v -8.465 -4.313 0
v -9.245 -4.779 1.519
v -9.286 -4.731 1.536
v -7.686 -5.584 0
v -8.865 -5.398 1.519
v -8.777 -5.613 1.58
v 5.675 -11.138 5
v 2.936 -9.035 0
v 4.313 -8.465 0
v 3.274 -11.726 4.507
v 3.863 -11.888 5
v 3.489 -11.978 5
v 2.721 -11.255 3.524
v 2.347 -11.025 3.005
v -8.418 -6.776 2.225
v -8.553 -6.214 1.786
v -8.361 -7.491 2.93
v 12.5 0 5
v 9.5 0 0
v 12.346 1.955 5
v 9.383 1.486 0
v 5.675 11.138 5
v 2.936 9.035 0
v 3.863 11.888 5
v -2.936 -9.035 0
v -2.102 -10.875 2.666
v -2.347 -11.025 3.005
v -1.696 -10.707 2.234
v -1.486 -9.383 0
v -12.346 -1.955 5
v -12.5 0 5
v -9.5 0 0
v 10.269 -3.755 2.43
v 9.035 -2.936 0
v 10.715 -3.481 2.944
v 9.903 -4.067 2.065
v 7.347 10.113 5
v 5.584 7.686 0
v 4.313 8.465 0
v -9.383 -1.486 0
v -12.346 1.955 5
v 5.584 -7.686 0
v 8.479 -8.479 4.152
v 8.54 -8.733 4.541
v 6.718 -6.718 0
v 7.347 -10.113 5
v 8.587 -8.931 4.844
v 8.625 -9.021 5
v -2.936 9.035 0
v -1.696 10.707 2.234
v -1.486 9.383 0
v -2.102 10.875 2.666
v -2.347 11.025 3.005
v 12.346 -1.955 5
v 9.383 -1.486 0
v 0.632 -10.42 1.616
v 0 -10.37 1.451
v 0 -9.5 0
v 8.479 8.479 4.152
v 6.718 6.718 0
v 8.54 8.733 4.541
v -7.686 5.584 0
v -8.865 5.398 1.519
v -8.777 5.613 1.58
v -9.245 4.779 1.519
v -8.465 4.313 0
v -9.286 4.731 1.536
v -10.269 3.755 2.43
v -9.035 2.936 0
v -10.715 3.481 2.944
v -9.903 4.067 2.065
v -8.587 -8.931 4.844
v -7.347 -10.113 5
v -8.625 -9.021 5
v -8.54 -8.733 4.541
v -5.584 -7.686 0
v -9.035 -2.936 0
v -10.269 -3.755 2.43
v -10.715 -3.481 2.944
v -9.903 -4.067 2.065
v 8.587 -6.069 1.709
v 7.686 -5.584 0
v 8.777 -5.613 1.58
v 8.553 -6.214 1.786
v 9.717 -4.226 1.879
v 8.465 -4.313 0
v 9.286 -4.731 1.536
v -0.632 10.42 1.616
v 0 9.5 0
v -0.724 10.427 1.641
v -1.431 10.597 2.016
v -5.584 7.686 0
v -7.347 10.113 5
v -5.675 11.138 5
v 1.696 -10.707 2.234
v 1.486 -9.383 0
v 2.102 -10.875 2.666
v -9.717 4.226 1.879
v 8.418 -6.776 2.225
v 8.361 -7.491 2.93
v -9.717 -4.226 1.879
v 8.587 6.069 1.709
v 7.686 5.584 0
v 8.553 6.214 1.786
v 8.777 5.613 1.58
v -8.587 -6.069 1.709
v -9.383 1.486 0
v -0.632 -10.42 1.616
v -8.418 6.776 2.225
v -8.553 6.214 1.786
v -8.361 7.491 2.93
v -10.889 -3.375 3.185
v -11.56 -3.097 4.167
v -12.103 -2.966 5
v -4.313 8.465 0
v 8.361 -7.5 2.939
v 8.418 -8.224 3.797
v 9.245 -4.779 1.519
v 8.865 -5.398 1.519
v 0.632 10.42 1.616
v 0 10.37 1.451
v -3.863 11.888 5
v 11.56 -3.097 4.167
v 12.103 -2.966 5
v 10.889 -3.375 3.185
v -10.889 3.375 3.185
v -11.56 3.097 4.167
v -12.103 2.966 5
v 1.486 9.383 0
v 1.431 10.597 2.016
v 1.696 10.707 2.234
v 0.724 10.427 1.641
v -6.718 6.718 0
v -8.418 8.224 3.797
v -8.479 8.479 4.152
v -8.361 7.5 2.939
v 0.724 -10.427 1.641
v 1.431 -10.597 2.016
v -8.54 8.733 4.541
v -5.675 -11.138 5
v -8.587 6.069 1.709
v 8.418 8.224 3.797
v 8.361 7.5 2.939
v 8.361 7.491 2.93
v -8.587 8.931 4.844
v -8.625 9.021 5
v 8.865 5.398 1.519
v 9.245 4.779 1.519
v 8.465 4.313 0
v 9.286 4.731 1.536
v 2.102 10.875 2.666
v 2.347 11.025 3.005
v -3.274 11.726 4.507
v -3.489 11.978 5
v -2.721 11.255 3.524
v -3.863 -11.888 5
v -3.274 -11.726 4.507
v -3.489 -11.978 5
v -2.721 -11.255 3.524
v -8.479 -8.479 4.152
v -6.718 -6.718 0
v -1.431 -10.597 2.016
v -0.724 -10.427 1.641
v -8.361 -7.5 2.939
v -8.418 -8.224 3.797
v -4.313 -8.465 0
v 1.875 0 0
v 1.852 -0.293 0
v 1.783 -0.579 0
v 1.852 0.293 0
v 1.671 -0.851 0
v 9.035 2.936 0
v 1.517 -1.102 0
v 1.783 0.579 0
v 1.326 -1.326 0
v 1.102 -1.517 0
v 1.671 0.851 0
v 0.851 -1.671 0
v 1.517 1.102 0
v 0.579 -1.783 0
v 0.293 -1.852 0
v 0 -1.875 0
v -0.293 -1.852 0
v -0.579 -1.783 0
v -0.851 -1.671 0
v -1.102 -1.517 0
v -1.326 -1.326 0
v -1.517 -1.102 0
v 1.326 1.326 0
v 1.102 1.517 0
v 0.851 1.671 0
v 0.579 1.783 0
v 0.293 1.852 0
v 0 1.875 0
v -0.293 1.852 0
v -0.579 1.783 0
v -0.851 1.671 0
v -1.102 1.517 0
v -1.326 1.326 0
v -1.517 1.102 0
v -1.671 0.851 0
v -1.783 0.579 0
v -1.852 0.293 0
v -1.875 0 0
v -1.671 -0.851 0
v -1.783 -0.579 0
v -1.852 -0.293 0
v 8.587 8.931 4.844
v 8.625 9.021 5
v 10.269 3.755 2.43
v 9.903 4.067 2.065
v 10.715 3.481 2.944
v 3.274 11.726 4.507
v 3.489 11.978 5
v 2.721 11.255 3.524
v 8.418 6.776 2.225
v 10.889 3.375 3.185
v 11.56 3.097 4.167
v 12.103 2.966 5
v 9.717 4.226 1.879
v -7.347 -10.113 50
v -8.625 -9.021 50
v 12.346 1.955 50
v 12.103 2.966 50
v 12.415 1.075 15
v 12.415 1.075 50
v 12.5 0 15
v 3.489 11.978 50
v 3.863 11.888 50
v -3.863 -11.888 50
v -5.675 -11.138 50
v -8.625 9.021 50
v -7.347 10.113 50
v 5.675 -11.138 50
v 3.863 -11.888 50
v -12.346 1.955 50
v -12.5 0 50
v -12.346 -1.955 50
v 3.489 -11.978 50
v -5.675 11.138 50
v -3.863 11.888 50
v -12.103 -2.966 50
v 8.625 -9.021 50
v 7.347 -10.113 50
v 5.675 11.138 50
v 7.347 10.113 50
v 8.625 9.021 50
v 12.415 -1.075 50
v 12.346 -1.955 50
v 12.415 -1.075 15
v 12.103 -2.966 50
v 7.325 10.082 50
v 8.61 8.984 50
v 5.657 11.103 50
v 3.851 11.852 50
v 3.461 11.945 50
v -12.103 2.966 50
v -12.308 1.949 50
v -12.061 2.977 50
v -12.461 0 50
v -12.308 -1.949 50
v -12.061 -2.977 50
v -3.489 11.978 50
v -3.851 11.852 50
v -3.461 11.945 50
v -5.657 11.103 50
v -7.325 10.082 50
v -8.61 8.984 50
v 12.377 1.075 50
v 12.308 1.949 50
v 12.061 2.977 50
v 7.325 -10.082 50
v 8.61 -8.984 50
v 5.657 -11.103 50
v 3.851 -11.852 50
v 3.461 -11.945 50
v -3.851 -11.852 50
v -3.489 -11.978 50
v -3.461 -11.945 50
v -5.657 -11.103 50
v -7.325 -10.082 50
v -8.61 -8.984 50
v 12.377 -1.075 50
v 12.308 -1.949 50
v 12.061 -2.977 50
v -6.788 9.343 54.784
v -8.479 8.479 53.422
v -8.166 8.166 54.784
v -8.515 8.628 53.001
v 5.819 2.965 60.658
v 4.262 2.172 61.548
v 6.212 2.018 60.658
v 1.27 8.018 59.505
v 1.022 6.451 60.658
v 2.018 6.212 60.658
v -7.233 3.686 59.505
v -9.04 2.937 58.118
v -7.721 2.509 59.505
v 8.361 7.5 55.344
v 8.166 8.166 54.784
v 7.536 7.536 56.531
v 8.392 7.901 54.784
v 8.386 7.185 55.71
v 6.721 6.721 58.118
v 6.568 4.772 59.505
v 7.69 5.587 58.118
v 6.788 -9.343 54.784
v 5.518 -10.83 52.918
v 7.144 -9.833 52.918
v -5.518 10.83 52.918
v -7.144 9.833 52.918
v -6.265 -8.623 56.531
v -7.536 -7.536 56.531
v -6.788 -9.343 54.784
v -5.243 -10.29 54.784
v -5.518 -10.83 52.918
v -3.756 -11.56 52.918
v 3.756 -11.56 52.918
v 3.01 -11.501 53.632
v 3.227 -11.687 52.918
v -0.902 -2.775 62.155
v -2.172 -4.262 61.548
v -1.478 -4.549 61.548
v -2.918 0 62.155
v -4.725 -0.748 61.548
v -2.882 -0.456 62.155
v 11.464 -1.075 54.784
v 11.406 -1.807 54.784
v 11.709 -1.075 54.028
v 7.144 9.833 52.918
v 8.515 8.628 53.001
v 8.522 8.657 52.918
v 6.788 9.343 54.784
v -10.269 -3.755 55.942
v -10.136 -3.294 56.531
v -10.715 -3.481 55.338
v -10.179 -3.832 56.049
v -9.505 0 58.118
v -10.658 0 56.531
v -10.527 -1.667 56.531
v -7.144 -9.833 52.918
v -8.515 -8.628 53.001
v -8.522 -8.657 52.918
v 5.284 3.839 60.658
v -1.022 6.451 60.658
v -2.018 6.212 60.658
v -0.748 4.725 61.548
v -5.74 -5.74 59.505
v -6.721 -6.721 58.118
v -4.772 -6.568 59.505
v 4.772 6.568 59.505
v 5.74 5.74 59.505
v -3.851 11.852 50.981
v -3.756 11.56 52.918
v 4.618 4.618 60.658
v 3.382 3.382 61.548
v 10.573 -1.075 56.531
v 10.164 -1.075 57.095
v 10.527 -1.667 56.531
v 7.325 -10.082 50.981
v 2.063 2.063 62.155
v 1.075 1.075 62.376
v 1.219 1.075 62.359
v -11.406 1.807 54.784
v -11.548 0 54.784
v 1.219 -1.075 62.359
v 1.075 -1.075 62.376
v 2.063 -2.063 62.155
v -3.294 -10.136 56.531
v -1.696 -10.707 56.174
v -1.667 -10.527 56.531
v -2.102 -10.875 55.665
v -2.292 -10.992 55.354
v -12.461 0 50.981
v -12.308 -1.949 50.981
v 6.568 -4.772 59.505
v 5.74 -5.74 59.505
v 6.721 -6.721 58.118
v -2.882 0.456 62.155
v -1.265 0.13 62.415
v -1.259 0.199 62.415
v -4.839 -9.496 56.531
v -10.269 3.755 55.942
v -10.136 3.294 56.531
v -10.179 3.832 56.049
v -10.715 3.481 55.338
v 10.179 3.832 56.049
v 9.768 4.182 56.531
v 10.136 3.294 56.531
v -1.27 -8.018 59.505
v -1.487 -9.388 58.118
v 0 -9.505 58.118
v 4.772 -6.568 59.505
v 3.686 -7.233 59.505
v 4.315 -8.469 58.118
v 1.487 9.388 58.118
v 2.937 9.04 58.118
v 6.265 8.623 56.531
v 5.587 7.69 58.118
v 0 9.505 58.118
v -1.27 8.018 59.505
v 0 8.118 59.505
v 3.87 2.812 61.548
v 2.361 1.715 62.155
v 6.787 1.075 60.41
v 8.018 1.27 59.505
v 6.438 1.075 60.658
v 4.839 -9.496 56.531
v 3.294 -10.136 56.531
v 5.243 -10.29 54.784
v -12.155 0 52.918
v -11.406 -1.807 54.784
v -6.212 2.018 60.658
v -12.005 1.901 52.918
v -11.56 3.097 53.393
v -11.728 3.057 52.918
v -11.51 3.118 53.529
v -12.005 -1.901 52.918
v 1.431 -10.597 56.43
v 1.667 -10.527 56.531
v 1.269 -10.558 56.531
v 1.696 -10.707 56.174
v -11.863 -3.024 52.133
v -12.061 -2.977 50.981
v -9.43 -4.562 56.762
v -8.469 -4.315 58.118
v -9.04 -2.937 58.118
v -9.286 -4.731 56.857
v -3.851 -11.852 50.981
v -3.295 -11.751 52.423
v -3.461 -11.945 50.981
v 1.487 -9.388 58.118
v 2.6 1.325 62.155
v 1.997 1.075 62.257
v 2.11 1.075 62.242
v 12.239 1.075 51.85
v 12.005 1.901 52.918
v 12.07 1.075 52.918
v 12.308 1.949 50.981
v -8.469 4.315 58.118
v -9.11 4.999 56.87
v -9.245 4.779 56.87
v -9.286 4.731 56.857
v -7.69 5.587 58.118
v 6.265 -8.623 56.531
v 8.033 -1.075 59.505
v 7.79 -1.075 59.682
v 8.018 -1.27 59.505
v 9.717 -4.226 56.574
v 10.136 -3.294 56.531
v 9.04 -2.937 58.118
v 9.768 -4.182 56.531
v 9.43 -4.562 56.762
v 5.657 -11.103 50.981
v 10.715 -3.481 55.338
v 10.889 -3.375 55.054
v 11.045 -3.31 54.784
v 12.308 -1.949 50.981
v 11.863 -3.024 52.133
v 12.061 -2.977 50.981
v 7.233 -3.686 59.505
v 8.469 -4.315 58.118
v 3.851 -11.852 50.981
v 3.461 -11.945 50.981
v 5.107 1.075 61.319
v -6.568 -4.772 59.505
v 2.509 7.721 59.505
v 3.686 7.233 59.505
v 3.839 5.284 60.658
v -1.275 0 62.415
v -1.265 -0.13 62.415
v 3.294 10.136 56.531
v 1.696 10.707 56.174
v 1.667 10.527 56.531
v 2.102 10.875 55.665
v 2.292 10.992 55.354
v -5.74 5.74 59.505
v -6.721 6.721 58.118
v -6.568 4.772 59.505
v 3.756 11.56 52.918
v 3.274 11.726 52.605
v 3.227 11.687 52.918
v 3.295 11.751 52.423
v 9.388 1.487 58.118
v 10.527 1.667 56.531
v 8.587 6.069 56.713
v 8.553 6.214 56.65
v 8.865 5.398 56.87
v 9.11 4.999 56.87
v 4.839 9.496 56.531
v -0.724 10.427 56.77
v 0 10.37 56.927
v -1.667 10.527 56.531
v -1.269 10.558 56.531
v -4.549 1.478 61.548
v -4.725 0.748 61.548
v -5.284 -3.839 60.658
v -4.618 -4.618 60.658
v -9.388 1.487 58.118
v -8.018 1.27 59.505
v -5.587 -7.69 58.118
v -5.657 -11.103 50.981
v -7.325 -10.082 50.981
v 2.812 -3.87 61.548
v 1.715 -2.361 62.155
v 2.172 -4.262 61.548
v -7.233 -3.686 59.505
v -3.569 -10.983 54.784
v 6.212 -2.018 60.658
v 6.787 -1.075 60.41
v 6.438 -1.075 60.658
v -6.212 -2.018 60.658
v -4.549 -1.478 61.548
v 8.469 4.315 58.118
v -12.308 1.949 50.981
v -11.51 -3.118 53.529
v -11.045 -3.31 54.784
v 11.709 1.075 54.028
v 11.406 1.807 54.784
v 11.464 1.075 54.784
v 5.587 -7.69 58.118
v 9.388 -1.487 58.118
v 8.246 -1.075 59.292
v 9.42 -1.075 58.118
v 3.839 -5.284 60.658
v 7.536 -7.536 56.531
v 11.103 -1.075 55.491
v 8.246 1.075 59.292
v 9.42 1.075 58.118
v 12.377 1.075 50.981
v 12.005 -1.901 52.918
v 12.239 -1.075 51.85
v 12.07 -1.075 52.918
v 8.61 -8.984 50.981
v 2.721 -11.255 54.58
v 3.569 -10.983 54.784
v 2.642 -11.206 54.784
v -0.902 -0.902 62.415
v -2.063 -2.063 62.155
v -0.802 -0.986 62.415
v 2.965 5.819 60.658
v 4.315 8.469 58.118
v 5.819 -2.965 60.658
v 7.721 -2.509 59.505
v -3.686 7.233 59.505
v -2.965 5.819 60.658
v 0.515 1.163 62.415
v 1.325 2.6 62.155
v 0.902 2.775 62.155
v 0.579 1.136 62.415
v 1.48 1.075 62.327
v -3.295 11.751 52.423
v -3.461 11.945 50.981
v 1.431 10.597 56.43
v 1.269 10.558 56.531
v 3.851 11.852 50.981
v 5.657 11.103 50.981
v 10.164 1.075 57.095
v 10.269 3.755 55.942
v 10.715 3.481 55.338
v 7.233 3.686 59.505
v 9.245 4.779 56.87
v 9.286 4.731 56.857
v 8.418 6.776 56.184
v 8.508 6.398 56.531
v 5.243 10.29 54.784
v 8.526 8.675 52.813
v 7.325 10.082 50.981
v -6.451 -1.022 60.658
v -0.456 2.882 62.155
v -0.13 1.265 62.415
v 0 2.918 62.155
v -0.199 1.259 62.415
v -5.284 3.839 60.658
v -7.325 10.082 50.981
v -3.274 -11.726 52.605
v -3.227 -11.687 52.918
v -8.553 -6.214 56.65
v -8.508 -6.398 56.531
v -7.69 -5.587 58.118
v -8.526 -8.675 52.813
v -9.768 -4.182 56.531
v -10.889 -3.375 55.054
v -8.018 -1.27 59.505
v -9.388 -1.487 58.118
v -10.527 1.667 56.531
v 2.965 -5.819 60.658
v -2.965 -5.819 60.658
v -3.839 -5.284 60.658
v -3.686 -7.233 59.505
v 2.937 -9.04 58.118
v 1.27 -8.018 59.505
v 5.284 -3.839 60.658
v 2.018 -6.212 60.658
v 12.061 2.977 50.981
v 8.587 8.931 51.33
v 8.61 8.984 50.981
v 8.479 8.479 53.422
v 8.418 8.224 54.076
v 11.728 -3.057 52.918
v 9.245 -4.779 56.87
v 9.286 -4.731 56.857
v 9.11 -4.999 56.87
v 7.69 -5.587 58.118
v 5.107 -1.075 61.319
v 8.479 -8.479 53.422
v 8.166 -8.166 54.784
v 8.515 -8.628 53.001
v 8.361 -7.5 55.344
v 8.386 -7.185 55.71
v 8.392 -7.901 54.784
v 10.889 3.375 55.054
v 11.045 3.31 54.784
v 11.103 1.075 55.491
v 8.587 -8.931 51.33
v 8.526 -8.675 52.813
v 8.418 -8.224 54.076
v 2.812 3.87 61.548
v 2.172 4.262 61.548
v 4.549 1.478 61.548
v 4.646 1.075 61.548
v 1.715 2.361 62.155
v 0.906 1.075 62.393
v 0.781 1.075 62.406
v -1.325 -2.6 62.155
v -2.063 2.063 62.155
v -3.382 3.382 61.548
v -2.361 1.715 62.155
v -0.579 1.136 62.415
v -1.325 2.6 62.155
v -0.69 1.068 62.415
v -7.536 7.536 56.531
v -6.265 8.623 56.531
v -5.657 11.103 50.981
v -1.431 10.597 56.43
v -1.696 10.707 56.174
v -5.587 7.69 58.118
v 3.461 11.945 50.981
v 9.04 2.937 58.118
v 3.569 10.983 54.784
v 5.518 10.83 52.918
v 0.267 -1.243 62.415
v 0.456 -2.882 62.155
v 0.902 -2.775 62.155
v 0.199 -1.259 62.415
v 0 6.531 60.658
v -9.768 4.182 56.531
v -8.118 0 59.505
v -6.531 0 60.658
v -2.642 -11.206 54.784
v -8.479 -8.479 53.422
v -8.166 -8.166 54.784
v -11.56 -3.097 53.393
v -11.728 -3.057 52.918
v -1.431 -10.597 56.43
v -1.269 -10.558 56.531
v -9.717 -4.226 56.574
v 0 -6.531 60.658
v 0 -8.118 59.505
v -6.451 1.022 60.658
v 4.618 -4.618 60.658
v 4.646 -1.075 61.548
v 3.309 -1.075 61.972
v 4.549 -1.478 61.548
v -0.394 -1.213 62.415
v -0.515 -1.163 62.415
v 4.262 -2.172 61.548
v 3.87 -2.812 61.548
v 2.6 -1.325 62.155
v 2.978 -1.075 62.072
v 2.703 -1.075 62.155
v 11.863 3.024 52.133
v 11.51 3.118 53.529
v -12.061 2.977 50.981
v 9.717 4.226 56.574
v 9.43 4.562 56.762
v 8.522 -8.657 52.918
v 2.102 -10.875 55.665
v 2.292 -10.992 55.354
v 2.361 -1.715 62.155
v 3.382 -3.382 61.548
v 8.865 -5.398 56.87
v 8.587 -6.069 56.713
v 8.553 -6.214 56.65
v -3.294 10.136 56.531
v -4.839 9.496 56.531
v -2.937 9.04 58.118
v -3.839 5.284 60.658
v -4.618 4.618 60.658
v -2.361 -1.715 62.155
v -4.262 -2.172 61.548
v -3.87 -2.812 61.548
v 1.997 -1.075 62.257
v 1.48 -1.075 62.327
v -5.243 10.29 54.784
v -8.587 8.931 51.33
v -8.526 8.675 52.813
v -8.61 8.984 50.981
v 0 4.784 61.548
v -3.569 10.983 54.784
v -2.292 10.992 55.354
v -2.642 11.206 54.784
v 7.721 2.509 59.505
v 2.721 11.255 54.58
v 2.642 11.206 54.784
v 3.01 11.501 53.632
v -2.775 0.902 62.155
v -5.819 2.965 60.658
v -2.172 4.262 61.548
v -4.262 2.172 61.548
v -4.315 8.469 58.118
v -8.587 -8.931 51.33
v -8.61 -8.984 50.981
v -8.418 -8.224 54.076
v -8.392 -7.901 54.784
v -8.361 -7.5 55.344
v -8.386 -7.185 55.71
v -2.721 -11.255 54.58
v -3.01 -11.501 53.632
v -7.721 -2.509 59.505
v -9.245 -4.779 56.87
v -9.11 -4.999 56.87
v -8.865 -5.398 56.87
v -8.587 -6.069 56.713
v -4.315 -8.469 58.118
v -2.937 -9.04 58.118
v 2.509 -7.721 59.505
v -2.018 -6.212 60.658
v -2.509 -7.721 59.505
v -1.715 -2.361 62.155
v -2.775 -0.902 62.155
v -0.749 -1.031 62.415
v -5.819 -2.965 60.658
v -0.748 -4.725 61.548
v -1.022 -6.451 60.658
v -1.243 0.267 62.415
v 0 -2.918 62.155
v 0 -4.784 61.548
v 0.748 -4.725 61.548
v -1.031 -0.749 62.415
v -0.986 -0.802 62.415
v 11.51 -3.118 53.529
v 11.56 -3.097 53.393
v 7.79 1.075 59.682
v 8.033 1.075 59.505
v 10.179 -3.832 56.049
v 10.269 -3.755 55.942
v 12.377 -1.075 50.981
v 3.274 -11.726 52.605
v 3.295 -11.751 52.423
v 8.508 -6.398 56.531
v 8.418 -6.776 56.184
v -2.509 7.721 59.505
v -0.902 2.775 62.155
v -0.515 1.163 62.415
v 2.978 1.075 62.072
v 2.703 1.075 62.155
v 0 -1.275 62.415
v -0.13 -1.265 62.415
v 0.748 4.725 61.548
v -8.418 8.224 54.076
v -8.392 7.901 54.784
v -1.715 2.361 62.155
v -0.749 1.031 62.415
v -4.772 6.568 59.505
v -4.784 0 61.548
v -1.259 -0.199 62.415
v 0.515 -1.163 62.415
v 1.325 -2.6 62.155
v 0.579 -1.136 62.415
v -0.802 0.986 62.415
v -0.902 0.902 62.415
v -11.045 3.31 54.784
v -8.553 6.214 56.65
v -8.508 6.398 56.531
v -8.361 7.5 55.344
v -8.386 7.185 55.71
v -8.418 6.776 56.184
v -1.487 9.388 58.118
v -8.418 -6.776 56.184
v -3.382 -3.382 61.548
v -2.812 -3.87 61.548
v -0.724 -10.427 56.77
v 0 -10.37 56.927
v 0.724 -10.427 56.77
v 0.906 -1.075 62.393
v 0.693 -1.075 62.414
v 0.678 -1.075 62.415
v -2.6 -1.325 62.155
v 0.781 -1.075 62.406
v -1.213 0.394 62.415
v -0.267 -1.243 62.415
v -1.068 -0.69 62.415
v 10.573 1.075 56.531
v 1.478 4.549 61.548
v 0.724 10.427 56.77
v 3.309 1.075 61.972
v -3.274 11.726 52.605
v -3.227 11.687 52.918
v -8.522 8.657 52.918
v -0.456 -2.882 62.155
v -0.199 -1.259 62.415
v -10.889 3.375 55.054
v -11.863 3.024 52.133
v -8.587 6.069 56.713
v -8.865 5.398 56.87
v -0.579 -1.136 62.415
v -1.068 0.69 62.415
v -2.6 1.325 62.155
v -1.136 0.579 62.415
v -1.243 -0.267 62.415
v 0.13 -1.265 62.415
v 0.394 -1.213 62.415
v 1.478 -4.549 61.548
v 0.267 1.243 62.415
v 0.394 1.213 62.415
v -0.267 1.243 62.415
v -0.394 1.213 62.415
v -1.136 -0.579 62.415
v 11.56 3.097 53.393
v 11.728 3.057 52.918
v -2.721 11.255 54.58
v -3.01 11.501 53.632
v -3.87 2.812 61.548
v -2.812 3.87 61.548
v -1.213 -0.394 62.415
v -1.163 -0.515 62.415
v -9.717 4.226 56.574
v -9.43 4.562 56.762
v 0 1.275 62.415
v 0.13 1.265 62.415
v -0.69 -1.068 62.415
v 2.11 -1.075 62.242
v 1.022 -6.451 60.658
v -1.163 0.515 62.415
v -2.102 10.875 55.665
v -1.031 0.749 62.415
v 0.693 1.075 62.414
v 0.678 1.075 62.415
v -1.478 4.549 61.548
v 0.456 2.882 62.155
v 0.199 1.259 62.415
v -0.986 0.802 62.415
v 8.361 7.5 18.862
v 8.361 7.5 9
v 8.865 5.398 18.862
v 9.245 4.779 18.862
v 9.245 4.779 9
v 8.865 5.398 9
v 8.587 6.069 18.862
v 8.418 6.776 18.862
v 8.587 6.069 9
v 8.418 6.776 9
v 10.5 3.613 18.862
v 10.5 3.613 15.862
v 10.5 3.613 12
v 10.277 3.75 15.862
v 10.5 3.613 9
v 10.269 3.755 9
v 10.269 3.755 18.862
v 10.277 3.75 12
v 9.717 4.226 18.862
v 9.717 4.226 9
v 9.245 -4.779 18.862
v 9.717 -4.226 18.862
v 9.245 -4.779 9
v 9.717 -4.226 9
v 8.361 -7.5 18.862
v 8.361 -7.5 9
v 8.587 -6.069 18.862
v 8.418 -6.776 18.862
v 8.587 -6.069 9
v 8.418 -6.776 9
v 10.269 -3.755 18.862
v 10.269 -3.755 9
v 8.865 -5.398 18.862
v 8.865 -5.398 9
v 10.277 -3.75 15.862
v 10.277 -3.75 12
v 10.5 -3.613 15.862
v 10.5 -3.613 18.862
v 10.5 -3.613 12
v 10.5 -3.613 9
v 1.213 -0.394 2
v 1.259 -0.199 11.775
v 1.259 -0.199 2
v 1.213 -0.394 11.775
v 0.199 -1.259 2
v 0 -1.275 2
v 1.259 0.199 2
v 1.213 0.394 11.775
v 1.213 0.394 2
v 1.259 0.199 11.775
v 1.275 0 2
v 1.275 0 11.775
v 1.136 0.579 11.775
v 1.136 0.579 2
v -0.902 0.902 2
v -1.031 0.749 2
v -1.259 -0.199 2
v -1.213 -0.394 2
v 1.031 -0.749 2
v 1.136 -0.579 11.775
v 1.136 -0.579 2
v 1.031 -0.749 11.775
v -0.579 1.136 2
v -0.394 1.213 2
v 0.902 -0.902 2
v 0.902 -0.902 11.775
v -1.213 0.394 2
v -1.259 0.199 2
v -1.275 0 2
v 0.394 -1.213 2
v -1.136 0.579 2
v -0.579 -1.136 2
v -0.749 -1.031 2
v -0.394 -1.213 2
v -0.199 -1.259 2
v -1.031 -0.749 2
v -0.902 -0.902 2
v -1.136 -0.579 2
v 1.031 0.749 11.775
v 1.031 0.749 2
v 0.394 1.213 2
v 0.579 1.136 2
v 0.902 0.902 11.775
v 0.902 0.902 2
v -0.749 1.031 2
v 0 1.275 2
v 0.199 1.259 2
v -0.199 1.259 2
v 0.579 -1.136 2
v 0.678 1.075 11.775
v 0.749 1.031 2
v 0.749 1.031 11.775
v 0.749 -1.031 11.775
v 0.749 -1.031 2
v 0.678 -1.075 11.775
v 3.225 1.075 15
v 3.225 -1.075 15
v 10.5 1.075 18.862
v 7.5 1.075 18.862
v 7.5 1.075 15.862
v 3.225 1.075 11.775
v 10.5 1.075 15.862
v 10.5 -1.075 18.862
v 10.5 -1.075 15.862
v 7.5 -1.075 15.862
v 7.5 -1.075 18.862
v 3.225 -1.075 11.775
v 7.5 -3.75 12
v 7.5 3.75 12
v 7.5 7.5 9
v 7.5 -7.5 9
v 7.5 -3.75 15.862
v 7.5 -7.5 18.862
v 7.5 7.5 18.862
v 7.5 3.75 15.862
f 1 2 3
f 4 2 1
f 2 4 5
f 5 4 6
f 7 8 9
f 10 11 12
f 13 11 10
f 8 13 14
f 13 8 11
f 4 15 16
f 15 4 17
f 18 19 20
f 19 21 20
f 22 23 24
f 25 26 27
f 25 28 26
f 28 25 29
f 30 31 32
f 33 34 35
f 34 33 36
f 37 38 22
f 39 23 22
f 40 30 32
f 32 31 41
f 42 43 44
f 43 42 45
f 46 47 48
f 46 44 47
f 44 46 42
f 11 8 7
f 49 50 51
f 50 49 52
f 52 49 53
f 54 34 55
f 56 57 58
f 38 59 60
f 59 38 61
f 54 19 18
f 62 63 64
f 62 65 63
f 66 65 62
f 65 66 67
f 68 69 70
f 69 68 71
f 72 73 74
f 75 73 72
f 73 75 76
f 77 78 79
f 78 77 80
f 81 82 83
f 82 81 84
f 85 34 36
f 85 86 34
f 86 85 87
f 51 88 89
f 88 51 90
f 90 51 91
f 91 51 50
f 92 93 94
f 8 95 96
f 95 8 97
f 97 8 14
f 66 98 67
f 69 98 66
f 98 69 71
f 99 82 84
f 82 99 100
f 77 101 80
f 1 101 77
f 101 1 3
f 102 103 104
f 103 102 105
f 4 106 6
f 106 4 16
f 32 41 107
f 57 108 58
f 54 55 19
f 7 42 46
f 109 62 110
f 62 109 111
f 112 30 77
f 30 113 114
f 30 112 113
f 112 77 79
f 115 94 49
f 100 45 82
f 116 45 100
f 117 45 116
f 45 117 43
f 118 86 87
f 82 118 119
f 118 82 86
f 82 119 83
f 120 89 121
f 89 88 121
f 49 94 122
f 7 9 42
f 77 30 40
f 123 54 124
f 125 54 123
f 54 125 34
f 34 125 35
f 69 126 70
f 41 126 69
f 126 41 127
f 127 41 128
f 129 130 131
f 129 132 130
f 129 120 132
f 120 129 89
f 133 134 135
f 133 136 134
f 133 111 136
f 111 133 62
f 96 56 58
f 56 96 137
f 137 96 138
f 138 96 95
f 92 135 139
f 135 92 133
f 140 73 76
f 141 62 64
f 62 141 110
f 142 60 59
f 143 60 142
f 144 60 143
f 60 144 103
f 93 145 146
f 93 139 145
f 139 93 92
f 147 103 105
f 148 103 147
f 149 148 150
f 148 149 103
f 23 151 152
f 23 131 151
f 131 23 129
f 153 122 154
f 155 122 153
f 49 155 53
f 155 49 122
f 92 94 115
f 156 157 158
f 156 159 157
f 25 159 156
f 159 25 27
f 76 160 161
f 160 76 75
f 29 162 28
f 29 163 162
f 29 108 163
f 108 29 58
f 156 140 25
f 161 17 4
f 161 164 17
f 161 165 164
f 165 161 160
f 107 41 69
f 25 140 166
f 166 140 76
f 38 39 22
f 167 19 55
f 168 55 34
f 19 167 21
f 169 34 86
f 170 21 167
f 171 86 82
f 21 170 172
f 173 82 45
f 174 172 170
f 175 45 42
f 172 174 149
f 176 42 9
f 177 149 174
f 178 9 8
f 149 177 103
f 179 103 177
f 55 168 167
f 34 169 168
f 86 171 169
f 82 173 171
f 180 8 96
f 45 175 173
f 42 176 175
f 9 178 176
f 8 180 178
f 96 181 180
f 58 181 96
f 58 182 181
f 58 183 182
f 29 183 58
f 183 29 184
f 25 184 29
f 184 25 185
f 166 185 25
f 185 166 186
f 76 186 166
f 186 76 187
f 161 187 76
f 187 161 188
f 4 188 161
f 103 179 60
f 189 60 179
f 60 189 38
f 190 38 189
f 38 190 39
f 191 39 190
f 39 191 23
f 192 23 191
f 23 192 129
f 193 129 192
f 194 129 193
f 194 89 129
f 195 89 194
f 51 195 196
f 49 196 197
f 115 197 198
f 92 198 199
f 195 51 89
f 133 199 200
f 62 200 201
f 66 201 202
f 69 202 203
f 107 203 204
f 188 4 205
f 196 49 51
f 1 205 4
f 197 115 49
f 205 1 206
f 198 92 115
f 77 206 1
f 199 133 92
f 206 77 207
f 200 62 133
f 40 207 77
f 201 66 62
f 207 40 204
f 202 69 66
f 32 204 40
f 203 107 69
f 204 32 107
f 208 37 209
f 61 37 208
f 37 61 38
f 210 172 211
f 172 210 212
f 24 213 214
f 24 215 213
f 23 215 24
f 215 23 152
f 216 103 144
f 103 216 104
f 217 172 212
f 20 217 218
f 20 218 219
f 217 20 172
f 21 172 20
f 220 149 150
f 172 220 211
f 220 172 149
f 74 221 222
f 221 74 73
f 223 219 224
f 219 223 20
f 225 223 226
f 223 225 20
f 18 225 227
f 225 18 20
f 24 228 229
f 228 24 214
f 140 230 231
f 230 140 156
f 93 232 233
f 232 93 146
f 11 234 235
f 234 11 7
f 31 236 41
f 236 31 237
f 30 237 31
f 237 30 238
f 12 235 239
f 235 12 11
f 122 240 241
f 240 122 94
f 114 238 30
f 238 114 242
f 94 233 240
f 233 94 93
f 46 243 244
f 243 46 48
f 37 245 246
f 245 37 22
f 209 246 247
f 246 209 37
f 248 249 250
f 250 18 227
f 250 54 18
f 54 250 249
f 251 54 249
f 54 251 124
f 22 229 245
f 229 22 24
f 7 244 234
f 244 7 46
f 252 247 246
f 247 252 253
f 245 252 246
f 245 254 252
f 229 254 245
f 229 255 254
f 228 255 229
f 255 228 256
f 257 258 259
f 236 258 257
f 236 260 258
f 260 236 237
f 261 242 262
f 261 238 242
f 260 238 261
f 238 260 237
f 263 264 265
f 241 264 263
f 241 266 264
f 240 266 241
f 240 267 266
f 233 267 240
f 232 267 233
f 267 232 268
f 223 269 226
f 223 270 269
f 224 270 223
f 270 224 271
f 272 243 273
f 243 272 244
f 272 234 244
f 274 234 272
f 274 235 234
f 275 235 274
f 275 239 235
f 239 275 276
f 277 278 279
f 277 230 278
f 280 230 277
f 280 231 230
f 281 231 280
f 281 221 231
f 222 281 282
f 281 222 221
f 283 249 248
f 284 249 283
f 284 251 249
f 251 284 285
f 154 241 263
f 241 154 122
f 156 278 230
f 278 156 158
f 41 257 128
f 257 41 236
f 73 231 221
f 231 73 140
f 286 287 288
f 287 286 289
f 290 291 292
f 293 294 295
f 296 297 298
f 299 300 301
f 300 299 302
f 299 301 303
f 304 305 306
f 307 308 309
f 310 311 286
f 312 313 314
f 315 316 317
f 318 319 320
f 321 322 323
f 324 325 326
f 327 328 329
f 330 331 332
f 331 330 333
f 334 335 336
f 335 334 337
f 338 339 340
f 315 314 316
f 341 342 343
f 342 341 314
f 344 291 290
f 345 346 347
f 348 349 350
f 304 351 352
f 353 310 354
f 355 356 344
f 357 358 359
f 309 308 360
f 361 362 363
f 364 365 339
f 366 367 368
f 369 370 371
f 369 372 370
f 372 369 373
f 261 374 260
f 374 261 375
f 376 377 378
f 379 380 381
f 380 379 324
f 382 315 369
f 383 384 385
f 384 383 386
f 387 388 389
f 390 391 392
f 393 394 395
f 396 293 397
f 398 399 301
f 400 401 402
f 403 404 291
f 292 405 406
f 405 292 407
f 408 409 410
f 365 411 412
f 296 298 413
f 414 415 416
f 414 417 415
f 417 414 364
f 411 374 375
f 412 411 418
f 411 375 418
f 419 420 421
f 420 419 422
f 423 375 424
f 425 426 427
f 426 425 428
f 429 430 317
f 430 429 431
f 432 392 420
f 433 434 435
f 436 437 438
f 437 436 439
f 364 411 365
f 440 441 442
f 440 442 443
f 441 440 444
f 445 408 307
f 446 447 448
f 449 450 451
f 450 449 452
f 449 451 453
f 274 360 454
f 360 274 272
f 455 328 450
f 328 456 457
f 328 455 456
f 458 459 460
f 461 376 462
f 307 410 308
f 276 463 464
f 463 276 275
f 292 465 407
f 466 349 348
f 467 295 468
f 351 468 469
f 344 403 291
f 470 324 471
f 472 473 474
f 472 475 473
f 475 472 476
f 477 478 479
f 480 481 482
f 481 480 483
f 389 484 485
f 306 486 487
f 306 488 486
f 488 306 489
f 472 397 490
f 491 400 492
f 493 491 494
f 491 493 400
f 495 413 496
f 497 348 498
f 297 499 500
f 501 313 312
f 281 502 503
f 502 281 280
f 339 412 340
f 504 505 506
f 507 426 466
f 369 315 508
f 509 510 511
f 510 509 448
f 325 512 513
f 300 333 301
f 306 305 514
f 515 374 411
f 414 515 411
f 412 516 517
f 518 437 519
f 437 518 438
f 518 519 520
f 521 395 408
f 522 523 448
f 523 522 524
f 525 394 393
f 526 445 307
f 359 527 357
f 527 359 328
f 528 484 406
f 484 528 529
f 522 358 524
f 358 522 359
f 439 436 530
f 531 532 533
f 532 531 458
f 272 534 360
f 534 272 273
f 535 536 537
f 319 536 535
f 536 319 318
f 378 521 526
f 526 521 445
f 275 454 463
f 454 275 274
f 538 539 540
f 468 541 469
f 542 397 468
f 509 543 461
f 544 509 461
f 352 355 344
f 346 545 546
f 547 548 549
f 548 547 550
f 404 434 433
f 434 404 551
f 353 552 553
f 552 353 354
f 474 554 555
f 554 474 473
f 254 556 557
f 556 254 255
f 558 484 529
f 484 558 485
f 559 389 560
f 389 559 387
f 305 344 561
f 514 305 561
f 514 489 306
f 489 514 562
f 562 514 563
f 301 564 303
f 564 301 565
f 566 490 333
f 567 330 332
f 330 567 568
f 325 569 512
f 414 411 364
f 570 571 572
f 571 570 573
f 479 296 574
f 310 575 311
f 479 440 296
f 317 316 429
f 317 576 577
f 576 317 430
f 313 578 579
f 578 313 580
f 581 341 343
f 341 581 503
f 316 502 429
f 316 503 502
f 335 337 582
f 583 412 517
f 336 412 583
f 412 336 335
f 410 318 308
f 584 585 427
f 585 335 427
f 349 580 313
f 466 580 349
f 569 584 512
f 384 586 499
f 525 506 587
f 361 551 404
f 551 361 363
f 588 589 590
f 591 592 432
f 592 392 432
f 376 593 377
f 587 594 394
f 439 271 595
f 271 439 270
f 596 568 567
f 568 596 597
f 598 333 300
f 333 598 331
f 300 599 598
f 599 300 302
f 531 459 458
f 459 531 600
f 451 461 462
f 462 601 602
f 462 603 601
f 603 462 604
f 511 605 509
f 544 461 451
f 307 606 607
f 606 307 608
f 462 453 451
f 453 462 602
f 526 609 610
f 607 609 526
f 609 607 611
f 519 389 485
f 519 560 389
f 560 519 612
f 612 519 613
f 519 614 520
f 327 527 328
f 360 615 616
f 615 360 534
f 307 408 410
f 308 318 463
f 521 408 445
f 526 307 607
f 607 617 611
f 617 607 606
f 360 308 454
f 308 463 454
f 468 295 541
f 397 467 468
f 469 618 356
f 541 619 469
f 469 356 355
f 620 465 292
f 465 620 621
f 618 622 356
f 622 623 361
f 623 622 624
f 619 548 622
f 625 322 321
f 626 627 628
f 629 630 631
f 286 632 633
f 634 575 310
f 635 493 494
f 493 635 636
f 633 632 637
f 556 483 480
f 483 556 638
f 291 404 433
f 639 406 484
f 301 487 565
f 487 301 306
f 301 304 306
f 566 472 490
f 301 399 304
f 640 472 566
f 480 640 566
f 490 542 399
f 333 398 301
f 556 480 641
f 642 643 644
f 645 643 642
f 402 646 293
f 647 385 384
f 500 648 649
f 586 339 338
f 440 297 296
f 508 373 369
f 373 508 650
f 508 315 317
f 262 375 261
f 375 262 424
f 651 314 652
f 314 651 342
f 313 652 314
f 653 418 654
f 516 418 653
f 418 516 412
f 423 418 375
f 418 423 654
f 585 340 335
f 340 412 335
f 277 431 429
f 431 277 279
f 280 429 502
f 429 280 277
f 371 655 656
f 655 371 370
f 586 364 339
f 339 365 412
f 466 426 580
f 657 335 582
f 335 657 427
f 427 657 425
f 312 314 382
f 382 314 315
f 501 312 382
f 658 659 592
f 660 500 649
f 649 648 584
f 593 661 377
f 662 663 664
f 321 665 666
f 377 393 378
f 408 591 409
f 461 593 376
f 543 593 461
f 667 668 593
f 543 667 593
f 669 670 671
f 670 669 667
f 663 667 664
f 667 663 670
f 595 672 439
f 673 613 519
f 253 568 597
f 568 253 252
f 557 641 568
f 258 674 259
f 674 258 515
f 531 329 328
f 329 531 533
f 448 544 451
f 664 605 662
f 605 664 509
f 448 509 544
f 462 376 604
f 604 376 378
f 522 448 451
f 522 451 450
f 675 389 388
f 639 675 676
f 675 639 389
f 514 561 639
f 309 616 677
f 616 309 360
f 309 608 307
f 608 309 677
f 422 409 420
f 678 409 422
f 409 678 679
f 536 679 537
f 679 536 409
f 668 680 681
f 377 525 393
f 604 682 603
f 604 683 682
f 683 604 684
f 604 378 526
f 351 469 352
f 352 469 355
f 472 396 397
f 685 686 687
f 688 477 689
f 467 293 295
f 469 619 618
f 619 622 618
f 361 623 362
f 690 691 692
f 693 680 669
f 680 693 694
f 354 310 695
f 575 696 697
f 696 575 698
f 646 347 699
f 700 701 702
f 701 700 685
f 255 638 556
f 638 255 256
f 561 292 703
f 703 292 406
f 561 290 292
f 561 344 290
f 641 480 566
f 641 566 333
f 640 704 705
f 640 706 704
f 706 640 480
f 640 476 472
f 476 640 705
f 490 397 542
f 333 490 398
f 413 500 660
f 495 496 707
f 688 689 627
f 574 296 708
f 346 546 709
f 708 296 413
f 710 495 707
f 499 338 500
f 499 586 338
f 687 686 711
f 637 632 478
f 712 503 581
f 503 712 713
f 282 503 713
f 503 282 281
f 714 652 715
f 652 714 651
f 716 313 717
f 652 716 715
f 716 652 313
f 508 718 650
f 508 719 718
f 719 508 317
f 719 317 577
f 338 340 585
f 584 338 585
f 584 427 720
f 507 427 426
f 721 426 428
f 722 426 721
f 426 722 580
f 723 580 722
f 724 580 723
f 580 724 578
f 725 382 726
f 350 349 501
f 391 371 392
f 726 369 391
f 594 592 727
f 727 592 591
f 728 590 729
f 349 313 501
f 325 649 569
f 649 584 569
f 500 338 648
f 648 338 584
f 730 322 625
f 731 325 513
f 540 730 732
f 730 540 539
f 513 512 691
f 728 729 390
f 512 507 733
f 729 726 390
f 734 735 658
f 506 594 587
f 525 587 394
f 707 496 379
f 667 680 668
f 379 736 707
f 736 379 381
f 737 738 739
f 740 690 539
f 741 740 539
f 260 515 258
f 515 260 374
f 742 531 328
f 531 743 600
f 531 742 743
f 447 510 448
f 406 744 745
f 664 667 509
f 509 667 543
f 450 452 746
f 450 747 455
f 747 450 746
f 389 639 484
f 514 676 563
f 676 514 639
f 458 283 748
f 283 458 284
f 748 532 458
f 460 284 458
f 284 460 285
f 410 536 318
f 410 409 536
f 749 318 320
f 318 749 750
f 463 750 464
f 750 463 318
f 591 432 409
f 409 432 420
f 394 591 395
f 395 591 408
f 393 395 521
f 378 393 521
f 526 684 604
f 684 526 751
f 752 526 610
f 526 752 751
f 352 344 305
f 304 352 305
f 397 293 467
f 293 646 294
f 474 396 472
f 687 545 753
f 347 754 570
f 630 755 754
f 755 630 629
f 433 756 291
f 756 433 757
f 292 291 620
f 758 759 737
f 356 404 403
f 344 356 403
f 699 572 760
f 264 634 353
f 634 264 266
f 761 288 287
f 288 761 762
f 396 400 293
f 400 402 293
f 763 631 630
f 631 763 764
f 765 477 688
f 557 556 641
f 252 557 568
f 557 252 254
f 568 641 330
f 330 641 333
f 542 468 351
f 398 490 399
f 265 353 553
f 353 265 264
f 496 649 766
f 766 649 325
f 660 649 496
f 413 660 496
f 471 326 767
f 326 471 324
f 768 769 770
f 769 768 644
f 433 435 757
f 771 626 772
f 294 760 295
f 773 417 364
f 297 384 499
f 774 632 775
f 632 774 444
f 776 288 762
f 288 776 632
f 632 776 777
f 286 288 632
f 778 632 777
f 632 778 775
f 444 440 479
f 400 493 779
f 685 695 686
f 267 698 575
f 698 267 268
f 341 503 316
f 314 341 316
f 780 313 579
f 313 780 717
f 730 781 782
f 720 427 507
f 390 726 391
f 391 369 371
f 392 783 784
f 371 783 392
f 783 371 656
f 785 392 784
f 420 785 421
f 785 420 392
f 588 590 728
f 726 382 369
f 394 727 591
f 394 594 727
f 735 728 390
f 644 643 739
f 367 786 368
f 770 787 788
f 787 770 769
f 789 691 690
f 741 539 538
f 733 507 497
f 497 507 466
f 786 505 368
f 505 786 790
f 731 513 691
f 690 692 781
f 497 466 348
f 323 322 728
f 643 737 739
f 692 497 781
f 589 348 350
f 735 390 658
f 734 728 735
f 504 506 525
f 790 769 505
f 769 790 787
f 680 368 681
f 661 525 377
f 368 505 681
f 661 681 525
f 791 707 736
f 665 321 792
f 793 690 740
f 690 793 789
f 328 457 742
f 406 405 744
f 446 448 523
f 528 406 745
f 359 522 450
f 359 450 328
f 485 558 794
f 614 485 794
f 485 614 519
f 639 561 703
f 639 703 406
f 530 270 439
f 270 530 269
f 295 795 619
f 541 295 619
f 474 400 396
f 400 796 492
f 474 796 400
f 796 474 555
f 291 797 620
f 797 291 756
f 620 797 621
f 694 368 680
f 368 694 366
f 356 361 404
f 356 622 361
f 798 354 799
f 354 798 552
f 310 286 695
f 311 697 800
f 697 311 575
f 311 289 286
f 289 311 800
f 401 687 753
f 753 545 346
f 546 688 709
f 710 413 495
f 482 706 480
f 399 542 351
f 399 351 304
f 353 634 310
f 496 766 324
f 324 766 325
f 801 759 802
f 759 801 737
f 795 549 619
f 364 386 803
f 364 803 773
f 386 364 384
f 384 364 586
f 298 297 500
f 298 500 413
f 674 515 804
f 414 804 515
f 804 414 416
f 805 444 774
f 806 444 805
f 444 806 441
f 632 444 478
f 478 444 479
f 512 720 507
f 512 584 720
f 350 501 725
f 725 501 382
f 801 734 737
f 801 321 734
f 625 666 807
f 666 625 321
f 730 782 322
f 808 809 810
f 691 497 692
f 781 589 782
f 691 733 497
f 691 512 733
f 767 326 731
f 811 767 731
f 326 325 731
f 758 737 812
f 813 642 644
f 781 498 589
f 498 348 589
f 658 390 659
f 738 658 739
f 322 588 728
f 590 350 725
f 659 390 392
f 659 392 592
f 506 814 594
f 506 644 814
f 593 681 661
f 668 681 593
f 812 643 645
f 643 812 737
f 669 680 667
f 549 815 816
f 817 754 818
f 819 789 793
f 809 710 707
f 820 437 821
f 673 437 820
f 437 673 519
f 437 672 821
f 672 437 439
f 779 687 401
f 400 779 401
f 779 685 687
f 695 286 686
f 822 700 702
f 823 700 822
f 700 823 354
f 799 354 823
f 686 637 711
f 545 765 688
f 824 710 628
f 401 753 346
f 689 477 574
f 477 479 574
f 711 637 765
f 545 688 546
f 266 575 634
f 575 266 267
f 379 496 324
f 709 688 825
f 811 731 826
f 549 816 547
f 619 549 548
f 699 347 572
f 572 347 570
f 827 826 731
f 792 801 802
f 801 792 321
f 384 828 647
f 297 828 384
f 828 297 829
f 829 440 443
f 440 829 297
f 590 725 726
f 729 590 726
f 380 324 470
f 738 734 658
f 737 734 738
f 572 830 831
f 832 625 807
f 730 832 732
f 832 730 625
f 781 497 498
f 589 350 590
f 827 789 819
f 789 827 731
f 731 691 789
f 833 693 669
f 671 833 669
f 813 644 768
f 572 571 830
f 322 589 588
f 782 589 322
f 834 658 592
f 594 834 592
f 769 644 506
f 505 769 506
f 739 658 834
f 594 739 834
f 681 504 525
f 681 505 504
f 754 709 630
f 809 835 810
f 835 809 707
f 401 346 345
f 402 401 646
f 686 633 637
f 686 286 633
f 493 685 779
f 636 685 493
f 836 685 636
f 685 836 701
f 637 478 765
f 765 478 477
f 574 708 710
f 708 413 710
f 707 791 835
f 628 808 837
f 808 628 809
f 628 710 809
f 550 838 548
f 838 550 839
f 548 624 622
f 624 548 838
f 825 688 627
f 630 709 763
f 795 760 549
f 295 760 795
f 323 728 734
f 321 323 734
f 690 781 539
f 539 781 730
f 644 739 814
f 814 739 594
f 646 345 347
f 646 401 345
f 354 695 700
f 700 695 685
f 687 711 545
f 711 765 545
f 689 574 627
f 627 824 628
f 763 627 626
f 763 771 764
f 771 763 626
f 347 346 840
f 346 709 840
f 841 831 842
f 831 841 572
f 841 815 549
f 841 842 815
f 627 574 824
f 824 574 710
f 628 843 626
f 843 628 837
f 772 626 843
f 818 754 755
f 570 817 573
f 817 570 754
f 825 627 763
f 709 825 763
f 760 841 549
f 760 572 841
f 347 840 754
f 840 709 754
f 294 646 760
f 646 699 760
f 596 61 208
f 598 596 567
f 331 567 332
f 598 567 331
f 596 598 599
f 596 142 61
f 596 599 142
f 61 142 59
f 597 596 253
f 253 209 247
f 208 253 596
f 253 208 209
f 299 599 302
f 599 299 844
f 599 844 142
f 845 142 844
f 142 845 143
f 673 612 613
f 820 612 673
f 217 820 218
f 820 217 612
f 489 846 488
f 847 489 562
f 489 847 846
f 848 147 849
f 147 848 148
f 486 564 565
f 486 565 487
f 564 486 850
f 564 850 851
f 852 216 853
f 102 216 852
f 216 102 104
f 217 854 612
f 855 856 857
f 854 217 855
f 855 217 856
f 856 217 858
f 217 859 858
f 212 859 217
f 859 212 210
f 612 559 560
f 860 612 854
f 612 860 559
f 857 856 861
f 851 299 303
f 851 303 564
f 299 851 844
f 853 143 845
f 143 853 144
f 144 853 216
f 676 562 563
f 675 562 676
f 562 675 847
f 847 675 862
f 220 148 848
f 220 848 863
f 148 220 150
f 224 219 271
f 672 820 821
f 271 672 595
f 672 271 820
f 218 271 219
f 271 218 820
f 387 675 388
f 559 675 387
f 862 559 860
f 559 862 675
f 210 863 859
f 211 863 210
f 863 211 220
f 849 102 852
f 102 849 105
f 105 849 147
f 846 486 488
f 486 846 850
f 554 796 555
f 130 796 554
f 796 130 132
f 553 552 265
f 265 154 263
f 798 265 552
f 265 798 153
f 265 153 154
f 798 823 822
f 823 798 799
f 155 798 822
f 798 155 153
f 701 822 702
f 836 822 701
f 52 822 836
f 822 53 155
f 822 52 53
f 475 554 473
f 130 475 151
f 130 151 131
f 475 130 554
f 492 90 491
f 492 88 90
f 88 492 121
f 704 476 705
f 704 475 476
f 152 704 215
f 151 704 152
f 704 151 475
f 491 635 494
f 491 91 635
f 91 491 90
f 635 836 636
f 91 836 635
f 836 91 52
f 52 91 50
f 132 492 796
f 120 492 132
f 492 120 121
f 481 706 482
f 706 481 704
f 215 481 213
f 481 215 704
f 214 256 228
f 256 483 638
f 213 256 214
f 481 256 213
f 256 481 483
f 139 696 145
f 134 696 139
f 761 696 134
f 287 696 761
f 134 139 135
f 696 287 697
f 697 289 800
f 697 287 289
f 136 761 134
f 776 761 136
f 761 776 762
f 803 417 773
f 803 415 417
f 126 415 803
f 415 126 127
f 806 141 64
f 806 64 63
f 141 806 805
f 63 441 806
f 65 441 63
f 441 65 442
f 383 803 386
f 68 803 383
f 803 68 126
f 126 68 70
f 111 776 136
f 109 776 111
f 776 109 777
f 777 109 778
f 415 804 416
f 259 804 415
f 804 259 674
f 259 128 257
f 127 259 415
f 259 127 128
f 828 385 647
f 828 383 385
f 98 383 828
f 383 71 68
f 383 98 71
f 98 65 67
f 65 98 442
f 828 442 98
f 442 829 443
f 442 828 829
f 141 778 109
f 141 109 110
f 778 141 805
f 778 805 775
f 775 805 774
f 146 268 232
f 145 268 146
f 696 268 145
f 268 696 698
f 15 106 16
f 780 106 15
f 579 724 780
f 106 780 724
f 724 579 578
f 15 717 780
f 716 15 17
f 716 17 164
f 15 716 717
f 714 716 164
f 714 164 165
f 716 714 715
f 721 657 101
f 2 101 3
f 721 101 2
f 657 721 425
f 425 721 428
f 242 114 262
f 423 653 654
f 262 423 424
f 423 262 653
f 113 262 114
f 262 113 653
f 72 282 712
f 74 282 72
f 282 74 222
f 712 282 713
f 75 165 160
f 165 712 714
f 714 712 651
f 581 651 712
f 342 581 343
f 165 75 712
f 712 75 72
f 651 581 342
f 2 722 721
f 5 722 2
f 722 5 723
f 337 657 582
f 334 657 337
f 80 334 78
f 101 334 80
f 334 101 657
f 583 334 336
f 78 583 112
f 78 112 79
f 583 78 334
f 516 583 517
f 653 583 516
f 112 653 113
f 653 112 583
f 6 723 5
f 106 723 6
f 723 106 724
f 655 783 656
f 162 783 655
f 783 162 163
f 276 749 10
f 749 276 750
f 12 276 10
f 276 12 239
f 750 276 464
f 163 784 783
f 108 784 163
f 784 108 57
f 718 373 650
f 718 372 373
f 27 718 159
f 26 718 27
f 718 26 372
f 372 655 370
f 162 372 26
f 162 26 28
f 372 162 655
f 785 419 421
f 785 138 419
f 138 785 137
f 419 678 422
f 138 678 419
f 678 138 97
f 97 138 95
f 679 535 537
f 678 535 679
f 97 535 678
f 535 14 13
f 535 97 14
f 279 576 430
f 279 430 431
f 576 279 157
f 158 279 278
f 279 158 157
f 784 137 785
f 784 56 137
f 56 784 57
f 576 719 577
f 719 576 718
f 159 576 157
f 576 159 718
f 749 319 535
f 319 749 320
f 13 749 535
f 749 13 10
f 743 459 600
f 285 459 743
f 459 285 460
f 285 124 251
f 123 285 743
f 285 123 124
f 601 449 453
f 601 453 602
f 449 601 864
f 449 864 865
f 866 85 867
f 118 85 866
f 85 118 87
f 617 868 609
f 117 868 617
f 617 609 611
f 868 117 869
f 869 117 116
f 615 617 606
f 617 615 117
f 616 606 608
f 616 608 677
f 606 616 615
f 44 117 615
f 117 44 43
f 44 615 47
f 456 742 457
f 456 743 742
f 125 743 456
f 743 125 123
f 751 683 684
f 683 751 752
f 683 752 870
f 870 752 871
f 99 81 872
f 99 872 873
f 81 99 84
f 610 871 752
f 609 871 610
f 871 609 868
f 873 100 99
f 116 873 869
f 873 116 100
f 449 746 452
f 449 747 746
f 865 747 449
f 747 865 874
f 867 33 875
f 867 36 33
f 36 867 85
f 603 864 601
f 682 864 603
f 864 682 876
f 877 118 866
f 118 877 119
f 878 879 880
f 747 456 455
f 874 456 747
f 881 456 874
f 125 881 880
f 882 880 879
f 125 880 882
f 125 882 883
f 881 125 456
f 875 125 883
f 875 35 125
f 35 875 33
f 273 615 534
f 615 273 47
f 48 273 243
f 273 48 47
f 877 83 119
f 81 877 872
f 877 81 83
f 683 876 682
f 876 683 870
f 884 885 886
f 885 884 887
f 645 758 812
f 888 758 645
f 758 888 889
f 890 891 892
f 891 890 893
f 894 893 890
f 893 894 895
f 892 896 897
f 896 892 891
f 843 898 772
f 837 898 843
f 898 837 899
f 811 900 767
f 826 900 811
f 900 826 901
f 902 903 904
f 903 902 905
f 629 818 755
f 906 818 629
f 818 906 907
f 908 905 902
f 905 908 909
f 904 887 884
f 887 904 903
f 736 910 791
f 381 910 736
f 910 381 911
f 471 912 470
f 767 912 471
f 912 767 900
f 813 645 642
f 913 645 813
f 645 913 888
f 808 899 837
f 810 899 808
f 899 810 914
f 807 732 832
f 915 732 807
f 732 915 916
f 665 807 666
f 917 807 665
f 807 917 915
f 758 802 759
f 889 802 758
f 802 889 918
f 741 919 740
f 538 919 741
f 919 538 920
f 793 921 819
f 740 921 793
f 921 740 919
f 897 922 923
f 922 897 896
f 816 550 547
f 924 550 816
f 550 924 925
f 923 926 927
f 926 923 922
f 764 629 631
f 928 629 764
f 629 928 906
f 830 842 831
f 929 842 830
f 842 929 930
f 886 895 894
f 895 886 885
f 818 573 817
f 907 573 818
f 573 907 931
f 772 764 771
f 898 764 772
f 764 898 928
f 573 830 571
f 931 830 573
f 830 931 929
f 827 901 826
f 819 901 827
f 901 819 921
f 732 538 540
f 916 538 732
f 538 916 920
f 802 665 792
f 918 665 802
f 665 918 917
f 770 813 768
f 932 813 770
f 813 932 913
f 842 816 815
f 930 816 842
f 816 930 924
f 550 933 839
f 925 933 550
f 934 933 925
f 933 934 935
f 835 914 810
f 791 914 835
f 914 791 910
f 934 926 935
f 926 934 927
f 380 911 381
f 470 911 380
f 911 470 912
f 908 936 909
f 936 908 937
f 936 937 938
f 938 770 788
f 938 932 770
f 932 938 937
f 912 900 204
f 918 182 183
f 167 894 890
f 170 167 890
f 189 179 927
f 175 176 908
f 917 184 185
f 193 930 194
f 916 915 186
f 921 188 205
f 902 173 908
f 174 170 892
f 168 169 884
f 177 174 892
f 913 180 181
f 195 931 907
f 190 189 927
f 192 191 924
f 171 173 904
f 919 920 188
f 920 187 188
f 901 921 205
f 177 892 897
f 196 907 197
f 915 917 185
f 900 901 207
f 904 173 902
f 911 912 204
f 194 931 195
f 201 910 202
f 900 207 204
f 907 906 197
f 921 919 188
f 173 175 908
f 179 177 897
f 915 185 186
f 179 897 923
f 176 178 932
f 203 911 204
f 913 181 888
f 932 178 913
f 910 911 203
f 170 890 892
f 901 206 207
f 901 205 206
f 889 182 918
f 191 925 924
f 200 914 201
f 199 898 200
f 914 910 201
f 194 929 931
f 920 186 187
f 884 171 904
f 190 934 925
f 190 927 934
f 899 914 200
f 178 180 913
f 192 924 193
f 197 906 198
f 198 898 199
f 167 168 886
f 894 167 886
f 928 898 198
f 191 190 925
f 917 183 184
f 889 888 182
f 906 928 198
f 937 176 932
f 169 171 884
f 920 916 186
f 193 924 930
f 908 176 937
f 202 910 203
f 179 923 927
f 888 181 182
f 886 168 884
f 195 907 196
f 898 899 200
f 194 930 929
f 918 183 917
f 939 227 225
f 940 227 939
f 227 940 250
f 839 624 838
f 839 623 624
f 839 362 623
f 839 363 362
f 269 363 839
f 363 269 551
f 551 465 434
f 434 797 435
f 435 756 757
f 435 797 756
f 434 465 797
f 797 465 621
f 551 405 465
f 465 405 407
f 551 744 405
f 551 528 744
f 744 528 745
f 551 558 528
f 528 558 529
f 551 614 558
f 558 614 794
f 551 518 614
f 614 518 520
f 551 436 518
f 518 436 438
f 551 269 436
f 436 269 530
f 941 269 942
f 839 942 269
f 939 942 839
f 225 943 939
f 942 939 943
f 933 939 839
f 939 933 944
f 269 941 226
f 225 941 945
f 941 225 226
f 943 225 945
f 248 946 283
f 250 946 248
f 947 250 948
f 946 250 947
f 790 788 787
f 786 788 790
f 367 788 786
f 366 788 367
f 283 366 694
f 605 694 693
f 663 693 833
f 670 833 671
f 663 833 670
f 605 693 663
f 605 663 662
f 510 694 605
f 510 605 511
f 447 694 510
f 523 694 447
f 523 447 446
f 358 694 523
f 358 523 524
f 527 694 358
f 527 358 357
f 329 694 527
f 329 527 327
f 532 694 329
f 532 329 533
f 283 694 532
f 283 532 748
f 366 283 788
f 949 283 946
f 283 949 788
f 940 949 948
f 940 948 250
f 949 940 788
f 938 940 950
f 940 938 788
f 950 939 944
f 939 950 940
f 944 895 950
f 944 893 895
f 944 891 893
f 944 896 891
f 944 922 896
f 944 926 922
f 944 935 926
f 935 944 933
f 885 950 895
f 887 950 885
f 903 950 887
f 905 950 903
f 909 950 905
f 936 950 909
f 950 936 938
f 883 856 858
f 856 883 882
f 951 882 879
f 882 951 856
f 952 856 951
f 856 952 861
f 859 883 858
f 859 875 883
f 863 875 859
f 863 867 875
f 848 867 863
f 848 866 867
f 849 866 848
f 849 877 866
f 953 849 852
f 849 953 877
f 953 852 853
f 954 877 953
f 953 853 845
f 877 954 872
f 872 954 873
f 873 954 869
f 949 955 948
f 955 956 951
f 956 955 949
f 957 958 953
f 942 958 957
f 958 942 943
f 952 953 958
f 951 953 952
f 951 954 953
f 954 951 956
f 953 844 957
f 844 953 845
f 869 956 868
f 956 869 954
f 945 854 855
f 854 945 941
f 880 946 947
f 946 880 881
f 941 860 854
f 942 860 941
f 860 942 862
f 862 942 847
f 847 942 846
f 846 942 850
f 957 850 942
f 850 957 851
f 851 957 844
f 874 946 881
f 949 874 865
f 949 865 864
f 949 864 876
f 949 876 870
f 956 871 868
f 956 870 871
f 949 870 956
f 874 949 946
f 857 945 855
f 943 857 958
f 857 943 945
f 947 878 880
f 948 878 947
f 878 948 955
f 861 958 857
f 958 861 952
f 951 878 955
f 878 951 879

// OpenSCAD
// Diameter of hole for the hex wrench
hex_size = 2;

// Increase slot size by this amount
hole_delta = 0.15;

// Diameter of the handle
handle_diameter = 25;

handle(hex_size);

module handle(hex_size)
{
	hex_radius = (hex_size + hole_delta) / 2;
	hex_size = hex_size + hole_delta;
	handle_radius = handle_diameter / 2;
	knurl_offset = handle_radius * 1.2;
	handle_height = 50;
	slot_width = 1.2 * handle_radius;
	zip_tie_back = 0.6 * handle_radius;
	slot_bottom = 15;

	$fn=40;									// Control quality of mesh

	hole_radius = hex_radius + .2;	// Give a little more room for small hole

	difference()
	{
		union()
		{
			cylinder(h = 5, r1 = handle_radius - 3, r2 = handle_radius);
			translate(v=[0, 0, 5])
				cylinder(h = handle_height - 5, r = handle_radius);
			translate(v=[0, 0, handle_height])
				sphere(handle_radius);
		}

		for (angle = [30:60:360])
			translate(v=[knurl_offset * cos(angle), knurl_offset * sin(angle), 0])
				cylinder(h = handle_height + handle_radius, r = handle_radius / 2.7);

		// Shaft hole
		cylinder(h = handle_height + handle_radius, r = hole_radius);

		// Small cone at bottom
		cylinder(h = 2, r1 = hole_radius + .6, r2 = hole_radius);

		// Slot for the wrench
		translate(v=[0, -hex_size / 2, slot_bottom])
			cube(size = [handle_radius, hex_size, handle_height + handle_radius]);

		// Slot for bend in wrench
		translate(v=[0, -hex_size / 2, slot_bottom - 1.5 * hex_size])
			cube(size = [1.5 * hex_size, hex_size, 2 * hex_size]);

		// Lower slot for zip-tie
		translate(v=[zip_tie_back, -slot_width / 2, slot_bottom - 6])
			cube(size=[3, slot_width, 3]);

		// Upper slot for zip tie
		translate(v=[zip_tie_back, -slot_width / 2, slot_bottom + sin(60) * hex_size - 1])
			cube(size=[3, slot_width, 3]);

		// Zip Tie Opening
		translate(v=[zip_tie_back, slot_width / 4, slot_bottom - 6])
			cube(size=[3, slot_width / 4, 6 + sin(60) * hex_size + 2]);

		translate(v=[zip_tie_back, -slot_width / 2, slot_bottom - 6])
			cube(size=[3, slot_width / 4, 6 + sin(60) * hex_size + 2]);
	}
}
